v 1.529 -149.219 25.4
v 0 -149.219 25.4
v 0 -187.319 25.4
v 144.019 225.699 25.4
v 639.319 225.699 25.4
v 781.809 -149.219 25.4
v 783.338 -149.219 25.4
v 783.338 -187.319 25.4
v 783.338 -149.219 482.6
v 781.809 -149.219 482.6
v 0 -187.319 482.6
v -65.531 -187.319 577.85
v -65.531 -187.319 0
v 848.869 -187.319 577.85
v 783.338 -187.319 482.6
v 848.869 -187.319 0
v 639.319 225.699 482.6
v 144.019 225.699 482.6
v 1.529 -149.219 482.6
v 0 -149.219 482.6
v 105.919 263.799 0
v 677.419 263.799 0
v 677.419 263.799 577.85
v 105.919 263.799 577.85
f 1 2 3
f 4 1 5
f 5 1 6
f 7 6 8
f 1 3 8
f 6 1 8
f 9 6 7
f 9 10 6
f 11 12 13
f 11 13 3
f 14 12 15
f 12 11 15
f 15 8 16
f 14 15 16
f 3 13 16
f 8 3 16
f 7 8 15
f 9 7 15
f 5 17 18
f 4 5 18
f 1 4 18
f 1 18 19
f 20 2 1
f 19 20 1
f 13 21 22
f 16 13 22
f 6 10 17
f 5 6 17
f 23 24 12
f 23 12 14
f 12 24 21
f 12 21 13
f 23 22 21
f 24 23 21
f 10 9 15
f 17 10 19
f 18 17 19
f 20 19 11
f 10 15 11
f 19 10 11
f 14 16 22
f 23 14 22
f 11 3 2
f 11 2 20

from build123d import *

# Parameters (mm, degrees)
F2_DEPTH = 482.6
F5_DEPTH = 95.25
F6_DEPTH = 457.2
F7_W     = 391.6691155402
F7_H     = 457.2
F8_DEPTH = 38.1


with BuildPart() as f2:
    # F1 (on face) → F2 (new body)
    with BuildSketch(Plane.XY):
        Polygon((848.8691155402, -187.3188240631), (677.4191155402, 263.7994060052), (105.9191155402, 263.7994060052), (-65.5308844598, -187.3188240631), align=None)
    extrude(amount=F2_DEPTH)

    # F3 (on face) → F5 (join)
    with BuildSketch(Plane.XY.offset(482.6)):
        Polygon((677.4191155402, 263.7994060052), (105.9191155402, 263.7994060052), (-65.5308844598, -187.3188240631), (848.8691155402, -187.3188240631), align=None)
        Polygon((1.5293506387, -149.2188240631), (144.0191155402, 225.6994060052), (639.3191155402, 225.6994060052), (781.8088804417, -149.2188240631), align=None, mode=Mode.SUBTRACT)
        Polygon((639.3191155402, 225.6994060052), (144.0191155402, 225.6994060052), (1.5293506387, -149.2188240631), (781.8088804417, -149.2188240631), align=None)
    extrude(amount=F5_DEPTH)

    # F4 (on face) → F6 (cut)
    with BuildSketch(Plane.XY.offset(482.6)):
        Polygon((781.8088804417, -149.2188240631), (639.3191155402, 225.6994060052), (144.0191155402, 225.6994060052), (1.5293506387, -149.2188240631), align=None)
    extrude(amount=-F6_DEPTH, mode=Mode.SUBTRACT)

    # F7 (on face) → F8 (cut)
    with BuildSketch(Plane.XZ.offset(187.3188240631)):
        with Locations((587.5036733103, 254)):
            Rectangle(F7_W, F7_H)
        with Locations((195.8345577701, 254)):
            Rectangle(F7_W, F7_H)
    extrude(amount=-F8_DEPTH, mode=Mode.SUBTRACT)


solid = f2.part
